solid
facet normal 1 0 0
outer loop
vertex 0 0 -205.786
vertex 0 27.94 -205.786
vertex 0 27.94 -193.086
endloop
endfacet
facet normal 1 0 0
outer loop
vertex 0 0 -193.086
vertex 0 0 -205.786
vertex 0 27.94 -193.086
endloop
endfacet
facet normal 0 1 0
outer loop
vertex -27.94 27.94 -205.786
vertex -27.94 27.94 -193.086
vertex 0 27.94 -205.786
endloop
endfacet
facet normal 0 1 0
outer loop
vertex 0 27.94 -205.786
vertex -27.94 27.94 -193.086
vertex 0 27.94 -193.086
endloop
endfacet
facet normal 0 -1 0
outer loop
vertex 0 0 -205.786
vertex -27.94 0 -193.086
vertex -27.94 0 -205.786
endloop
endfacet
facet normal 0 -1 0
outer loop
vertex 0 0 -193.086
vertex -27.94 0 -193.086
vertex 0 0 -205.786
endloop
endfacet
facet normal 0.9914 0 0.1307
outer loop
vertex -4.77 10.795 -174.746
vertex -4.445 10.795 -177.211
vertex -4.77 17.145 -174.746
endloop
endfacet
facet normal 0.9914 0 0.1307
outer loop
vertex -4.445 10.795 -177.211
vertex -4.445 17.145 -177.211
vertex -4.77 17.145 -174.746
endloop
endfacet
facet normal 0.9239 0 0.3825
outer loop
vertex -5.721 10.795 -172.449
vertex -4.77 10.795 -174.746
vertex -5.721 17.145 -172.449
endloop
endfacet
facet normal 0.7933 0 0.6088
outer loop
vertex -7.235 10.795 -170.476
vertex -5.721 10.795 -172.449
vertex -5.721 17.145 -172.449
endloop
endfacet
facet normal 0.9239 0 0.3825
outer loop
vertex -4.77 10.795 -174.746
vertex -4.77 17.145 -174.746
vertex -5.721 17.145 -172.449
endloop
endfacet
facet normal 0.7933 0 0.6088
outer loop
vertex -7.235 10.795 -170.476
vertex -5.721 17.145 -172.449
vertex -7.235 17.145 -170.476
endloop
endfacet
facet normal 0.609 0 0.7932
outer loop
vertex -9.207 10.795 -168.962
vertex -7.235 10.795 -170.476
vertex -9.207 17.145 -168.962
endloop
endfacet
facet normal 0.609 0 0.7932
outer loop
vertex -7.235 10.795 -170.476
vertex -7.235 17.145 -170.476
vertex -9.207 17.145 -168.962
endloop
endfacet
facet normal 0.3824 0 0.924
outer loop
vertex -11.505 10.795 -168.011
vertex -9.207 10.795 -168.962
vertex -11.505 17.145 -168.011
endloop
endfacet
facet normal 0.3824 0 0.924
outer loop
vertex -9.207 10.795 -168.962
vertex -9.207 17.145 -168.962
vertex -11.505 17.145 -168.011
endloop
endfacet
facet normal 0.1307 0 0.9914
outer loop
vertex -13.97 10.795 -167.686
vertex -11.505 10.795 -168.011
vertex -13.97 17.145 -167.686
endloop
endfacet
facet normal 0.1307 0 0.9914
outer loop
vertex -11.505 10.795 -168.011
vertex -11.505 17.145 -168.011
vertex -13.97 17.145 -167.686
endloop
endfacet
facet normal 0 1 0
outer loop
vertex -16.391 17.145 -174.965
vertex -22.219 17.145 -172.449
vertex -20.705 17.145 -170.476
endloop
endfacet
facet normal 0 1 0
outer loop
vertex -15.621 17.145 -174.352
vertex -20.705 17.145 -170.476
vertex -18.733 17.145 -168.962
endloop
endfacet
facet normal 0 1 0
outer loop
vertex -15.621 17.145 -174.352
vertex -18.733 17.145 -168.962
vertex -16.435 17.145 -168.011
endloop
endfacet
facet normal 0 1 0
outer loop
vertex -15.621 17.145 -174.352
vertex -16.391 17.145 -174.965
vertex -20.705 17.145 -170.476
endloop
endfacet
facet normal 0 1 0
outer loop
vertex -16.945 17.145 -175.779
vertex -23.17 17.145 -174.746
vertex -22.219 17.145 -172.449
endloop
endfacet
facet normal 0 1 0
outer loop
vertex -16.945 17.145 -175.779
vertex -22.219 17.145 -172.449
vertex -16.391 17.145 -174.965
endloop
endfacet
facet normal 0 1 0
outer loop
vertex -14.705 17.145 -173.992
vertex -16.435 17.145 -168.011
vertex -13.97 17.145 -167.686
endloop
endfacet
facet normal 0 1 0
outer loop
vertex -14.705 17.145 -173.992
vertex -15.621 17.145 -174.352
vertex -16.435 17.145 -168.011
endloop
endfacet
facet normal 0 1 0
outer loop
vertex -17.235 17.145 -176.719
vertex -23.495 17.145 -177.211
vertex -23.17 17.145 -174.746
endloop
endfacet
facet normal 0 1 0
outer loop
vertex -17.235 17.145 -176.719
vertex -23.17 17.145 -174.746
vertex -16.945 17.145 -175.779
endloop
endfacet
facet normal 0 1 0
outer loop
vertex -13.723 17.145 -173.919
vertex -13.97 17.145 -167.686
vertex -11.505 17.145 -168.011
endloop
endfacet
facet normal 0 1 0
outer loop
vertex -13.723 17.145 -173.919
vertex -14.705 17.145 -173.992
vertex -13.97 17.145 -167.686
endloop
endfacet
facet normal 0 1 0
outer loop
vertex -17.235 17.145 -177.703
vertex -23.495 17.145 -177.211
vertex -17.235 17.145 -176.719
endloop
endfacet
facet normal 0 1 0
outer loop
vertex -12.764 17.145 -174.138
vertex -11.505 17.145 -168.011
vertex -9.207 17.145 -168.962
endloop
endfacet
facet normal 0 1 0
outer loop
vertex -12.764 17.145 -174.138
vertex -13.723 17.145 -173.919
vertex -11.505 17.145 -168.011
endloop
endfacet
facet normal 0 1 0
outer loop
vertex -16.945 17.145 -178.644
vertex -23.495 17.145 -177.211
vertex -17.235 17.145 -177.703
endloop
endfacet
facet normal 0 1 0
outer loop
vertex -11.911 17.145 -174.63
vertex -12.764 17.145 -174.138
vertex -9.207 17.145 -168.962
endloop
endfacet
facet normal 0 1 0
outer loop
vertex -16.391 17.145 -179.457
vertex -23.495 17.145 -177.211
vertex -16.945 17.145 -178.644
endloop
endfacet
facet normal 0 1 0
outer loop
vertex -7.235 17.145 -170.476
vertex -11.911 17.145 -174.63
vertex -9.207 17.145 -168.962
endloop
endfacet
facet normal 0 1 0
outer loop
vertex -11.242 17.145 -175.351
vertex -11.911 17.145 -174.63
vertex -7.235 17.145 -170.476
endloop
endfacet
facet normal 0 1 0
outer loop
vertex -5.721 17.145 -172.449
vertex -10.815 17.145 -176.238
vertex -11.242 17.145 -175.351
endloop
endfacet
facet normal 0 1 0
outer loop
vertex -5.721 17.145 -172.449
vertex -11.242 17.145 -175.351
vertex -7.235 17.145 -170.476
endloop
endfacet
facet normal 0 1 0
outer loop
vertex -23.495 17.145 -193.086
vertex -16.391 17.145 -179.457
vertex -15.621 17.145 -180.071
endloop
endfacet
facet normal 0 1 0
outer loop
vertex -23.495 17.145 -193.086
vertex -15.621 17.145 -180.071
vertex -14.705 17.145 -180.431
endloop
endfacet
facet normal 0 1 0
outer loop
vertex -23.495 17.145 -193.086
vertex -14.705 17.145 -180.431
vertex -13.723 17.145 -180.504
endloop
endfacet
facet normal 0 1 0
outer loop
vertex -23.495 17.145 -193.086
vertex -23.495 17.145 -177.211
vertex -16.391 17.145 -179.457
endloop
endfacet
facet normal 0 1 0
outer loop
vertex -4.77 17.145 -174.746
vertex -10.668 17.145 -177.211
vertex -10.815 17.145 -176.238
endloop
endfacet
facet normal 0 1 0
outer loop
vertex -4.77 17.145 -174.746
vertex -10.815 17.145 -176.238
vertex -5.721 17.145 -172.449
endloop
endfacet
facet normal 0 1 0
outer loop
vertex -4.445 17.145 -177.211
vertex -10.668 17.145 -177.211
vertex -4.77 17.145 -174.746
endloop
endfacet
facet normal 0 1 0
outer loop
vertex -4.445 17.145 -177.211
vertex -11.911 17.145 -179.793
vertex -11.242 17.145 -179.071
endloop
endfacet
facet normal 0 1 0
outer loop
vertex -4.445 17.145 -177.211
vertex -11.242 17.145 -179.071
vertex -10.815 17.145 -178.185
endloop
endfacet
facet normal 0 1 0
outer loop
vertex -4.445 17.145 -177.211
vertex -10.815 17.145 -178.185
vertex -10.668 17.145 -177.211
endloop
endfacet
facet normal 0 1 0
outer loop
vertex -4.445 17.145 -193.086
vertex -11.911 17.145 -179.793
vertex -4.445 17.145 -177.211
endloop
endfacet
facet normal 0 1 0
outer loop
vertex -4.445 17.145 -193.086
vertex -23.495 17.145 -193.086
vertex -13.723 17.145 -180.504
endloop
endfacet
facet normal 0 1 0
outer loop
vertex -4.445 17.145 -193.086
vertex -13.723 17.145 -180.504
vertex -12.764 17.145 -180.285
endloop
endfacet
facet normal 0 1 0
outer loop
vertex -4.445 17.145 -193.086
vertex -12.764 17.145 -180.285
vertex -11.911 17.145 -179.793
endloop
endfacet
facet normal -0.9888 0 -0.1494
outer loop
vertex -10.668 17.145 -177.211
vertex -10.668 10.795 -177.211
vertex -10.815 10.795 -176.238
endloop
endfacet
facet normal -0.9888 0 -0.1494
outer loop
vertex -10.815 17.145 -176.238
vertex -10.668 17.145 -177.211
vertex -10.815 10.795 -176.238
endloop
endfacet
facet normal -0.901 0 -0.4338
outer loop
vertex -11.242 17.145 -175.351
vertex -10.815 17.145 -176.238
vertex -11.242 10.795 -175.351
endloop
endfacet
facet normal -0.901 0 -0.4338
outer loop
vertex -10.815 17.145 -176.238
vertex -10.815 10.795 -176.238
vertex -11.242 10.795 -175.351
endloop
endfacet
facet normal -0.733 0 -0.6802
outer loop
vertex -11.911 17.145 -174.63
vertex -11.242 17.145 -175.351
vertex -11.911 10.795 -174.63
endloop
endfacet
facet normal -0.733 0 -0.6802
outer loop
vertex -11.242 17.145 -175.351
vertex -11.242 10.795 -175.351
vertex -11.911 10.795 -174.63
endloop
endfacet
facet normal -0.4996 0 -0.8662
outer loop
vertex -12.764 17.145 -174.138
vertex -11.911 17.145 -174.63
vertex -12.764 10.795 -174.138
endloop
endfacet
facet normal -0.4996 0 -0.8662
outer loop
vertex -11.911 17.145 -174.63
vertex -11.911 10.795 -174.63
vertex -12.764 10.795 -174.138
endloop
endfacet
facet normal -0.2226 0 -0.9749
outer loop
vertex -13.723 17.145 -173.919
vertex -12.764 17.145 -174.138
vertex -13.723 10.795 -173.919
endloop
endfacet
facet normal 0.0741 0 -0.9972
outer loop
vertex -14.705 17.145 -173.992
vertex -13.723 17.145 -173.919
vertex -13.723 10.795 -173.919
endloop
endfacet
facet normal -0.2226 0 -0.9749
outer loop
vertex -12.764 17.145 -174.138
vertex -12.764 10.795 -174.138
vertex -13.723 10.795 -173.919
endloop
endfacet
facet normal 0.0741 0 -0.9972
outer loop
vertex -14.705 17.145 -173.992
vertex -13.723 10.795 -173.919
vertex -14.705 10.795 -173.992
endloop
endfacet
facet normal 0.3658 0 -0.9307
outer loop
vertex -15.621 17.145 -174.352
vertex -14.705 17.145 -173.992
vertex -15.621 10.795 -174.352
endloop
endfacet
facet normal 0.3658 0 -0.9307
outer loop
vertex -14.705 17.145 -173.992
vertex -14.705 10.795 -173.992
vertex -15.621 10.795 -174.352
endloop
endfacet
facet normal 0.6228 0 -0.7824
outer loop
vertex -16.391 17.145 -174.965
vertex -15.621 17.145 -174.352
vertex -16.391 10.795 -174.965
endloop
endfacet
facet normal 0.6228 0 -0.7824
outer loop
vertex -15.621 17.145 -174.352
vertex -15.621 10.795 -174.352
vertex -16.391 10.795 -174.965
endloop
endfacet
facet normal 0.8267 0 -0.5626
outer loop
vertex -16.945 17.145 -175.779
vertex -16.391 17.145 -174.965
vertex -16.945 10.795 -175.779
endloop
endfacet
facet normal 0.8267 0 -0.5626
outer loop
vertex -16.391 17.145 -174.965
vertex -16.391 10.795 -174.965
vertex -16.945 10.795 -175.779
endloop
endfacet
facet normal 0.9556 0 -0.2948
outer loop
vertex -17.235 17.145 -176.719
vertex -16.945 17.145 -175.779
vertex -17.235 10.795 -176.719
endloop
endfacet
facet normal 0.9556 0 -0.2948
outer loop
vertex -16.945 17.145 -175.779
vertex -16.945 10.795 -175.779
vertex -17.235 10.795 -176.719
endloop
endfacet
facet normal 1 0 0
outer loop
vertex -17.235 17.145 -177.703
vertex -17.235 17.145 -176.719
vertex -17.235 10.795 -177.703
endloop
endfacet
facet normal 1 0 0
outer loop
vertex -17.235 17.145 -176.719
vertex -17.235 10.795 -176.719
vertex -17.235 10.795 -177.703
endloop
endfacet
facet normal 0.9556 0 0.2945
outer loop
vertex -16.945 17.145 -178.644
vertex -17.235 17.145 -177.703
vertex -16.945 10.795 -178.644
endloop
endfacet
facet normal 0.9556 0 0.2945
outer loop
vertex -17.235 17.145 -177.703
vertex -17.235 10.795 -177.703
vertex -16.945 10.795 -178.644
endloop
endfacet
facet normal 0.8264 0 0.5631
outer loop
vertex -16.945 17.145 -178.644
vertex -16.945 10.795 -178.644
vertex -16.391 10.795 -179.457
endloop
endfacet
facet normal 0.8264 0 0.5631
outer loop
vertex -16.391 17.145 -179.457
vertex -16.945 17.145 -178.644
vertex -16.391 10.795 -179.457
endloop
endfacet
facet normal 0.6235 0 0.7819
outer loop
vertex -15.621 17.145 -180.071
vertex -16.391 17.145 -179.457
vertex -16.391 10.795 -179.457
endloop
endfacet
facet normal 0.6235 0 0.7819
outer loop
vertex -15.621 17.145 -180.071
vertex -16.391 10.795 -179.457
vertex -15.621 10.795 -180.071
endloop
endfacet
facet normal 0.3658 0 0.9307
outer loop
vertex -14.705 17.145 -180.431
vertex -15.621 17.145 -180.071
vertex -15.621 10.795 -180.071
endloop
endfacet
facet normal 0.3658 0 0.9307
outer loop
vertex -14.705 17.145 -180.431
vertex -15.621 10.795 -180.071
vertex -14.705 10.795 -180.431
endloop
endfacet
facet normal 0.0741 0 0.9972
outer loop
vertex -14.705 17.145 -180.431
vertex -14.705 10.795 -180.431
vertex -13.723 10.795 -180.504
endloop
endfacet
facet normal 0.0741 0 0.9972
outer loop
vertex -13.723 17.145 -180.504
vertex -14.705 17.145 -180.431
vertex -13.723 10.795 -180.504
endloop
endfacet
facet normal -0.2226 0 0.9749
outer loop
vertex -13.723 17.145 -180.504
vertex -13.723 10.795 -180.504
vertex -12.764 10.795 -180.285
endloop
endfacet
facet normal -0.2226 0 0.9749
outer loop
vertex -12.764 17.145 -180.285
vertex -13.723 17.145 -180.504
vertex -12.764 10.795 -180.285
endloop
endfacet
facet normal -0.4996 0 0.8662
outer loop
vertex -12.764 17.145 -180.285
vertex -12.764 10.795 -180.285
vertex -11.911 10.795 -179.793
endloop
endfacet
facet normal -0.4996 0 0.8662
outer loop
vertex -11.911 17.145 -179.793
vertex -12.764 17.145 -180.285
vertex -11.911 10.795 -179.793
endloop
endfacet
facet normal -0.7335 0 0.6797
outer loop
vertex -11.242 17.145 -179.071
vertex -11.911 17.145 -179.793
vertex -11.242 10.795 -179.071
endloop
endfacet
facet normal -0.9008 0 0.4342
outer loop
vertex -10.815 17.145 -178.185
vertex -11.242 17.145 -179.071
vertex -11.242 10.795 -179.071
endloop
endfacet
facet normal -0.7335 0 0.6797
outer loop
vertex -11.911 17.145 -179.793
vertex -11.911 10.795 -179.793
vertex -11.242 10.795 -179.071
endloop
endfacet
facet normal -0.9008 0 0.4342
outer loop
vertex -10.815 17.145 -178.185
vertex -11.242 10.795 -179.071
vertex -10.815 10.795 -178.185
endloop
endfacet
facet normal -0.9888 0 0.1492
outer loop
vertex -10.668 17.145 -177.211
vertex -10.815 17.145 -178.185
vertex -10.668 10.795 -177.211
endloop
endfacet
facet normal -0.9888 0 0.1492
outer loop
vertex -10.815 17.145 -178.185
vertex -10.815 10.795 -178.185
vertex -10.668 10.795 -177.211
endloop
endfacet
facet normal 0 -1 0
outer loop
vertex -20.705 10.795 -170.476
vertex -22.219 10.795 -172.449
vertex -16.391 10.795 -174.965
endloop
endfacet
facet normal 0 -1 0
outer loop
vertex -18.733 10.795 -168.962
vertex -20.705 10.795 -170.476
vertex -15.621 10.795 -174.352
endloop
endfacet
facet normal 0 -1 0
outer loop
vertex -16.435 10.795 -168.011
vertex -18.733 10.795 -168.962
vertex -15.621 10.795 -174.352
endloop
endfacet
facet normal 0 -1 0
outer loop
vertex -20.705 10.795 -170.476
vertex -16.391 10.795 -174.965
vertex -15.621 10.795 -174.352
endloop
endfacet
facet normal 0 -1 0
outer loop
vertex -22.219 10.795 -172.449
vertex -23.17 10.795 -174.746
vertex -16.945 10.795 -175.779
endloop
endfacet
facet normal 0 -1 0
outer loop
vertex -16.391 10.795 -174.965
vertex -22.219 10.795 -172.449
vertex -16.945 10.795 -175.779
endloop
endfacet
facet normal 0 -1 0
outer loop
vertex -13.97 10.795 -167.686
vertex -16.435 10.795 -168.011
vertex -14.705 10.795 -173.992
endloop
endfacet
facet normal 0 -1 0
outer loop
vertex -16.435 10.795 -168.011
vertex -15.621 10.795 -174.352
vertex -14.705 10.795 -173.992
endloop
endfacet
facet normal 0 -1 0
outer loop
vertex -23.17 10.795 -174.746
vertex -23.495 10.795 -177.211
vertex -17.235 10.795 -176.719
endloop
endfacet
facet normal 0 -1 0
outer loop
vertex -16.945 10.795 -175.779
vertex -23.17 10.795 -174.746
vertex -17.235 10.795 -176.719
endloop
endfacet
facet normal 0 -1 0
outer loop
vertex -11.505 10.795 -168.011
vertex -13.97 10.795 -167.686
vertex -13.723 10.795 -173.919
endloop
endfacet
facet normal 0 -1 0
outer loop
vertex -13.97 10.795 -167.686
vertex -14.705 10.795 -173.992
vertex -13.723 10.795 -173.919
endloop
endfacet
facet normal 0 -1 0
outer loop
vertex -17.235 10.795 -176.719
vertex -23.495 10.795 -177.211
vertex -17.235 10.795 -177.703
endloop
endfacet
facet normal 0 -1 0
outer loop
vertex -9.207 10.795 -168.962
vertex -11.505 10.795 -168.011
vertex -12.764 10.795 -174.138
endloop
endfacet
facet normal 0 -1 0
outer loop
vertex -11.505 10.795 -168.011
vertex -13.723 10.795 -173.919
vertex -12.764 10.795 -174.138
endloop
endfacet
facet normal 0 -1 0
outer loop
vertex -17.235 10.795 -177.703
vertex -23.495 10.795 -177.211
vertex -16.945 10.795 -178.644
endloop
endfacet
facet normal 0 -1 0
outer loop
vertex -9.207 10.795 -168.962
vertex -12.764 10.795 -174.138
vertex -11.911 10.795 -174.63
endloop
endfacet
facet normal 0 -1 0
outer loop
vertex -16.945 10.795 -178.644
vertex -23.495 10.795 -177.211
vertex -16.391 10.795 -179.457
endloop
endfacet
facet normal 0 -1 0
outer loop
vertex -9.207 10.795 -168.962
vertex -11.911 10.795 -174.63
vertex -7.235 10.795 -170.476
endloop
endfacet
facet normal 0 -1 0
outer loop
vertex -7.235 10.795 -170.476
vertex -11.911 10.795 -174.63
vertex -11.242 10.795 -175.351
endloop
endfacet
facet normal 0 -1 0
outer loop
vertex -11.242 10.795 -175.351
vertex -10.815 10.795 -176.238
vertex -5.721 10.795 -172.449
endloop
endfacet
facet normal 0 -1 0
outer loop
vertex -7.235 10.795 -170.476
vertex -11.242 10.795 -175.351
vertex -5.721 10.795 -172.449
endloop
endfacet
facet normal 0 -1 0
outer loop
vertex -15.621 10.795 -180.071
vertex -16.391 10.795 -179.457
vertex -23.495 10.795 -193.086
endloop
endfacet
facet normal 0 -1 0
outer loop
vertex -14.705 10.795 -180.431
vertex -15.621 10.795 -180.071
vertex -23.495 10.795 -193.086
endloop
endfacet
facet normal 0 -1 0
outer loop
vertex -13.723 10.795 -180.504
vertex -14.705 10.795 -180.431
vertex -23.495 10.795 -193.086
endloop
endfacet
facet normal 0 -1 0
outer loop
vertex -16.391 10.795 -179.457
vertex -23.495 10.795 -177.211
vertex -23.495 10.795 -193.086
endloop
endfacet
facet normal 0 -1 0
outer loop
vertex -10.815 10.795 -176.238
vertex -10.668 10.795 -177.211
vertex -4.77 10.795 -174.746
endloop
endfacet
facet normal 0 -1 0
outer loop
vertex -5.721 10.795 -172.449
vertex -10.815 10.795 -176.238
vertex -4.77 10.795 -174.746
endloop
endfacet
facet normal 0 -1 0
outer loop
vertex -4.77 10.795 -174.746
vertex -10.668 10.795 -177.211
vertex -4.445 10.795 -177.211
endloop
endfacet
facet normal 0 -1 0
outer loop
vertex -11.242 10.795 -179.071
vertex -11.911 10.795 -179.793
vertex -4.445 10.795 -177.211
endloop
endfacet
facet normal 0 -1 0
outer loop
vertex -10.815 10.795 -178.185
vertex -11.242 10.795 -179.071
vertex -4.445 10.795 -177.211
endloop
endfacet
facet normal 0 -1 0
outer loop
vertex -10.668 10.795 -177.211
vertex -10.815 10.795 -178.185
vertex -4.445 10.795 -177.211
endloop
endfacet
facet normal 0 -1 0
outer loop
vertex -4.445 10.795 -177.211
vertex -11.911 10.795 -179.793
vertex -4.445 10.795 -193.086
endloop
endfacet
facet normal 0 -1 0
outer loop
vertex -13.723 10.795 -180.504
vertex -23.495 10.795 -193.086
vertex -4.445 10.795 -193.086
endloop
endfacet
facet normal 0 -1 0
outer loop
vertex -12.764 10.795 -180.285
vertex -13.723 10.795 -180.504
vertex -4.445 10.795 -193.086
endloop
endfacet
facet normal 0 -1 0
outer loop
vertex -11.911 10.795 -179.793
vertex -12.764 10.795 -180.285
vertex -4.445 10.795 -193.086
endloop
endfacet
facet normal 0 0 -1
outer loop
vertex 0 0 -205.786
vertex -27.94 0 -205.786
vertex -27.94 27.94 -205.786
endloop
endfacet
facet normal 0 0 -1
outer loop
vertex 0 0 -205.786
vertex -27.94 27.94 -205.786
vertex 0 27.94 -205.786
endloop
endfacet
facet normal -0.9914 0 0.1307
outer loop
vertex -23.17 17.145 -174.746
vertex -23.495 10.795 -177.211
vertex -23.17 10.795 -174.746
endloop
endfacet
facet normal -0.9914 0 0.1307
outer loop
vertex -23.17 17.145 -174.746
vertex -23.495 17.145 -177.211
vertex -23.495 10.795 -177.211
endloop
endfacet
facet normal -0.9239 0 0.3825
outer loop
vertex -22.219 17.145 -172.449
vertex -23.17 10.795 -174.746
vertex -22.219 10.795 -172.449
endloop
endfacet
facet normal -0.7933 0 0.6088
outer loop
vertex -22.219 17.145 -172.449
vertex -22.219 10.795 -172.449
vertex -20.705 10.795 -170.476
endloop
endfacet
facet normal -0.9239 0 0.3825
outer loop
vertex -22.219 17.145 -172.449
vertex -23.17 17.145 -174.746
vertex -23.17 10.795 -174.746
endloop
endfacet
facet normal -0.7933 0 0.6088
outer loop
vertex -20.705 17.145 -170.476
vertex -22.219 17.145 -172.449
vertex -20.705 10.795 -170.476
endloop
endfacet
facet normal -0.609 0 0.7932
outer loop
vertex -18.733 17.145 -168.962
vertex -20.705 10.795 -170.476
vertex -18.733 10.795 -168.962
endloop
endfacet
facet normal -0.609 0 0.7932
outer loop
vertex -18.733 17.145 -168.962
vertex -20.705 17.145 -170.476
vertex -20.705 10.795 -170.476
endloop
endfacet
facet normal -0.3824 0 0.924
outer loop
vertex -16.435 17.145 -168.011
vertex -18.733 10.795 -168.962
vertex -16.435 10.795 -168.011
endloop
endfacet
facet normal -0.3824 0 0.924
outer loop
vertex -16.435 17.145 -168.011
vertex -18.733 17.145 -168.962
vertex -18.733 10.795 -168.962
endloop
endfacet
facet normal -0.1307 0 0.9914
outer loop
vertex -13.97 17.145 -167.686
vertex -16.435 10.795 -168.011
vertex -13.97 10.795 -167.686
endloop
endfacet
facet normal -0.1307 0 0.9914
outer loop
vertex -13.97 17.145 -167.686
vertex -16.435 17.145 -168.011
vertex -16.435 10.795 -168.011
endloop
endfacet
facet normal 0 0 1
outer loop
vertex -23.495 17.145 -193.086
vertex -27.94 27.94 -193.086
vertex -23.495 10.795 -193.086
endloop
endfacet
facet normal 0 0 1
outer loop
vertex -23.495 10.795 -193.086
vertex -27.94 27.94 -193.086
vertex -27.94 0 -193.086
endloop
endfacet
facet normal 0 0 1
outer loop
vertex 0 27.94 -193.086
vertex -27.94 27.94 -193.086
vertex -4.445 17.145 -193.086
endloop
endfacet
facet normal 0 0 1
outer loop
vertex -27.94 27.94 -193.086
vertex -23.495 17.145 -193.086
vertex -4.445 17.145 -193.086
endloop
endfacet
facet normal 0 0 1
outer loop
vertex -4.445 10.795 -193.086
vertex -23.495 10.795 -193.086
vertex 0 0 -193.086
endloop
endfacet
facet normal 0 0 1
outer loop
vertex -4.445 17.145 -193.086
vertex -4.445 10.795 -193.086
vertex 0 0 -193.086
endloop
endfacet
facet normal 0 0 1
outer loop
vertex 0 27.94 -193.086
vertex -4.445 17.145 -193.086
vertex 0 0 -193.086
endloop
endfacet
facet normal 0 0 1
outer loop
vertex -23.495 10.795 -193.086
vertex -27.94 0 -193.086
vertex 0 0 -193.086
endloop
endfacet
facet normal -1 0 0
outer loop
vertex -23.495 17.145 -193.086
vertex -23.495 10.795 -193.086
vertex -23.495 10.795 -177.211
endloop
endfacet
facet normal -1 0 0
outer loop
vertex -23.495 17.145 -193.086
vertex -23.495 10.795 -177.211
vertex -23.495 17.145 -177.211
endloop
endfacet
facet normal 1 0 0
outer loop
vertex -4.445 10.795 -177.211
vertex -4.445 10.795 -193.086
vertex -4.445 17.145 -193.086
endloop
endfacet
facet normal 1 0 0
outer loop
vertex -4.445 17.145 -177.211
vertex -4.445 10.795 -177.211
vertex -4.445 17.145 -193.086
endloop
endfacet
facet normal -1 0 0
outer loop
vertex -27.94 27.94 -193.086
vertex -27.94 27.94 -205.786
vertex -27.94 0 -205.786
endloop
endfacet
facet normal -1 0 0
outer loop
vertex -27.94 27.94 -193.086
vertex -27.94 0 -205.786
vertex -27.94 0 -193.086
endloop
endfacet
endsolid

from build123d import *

# Parameters (mm, degrees)
F0_W     = 27.94
F0_H     = 12.7
F1_DEPTH = 27.94
F2_W     = 19.05
F2_H     = 6.35
F3_DEPTH = 25.4
F4_R     = 9.52499
F5_R     = 3.302
F6_DEPTH = 6.35
F7_W     = 1.5875
F7_H     = 12.7
F8_DEPTH = 22.225


# Not quite as in the source:
# - a fillet or chamfer is up to 0.001 mm smaller than in the source, because OpenCascade refuses the exact size


with BuildPart() as f1:
    # F0 (on Front) → F1 (new body)
    with BuildSketch(Plane.XZ):
        with Locations((-13.97, -199.4363271219)):
            Rectangle(F0_W, F0_H)
    extrude(amount=-F1_DEPTH)

    # F2 (on face) → F3 (join)
    with BuildSketch(Plane.XY.offset(-193.0863271219)):
        with Locations((-13.97, 13.97)):
            Rectangle(F2_W, F2_H)
    extrude(amount=F3_DEPTH)

    # F4 (radius 9.525 in the source; OpenCascade refuses exactly that, so slightly less here)
    f4_edges = [f1.edges().sort_by_distance(p)[0] for p in [
        (-4.445, 13.97, -167.686327),
        (-23.495, 13.97, -167.686327),
    ]]
    fillet(f4_edges, radius=F4_R)

    # F5 (on face) → F6 (cut)
    with BuildSketch(Plane.XZ.offset(-10.795)):
        with Locations((-13.97, -177.2113271219)):
            Circle(F5_R)
    extrude(amount=-F6_DEPTH, mode=Mode.SUBTRACT)

    # F7 (on face) → F8 (cut)
    with BuildSketch(Plane(origin=(-27.94, 0, 0), x_dir=(0, -1, 0), z_dir=(-1, 0, 0))):
        with Locations((-25.55875, -177.2113271219)):
            Rectangle(F7_W, F7_H)
    extrude(amount=-F8_DEPTH, mode=Mode.SUBTRACT)


solid = f1.part
